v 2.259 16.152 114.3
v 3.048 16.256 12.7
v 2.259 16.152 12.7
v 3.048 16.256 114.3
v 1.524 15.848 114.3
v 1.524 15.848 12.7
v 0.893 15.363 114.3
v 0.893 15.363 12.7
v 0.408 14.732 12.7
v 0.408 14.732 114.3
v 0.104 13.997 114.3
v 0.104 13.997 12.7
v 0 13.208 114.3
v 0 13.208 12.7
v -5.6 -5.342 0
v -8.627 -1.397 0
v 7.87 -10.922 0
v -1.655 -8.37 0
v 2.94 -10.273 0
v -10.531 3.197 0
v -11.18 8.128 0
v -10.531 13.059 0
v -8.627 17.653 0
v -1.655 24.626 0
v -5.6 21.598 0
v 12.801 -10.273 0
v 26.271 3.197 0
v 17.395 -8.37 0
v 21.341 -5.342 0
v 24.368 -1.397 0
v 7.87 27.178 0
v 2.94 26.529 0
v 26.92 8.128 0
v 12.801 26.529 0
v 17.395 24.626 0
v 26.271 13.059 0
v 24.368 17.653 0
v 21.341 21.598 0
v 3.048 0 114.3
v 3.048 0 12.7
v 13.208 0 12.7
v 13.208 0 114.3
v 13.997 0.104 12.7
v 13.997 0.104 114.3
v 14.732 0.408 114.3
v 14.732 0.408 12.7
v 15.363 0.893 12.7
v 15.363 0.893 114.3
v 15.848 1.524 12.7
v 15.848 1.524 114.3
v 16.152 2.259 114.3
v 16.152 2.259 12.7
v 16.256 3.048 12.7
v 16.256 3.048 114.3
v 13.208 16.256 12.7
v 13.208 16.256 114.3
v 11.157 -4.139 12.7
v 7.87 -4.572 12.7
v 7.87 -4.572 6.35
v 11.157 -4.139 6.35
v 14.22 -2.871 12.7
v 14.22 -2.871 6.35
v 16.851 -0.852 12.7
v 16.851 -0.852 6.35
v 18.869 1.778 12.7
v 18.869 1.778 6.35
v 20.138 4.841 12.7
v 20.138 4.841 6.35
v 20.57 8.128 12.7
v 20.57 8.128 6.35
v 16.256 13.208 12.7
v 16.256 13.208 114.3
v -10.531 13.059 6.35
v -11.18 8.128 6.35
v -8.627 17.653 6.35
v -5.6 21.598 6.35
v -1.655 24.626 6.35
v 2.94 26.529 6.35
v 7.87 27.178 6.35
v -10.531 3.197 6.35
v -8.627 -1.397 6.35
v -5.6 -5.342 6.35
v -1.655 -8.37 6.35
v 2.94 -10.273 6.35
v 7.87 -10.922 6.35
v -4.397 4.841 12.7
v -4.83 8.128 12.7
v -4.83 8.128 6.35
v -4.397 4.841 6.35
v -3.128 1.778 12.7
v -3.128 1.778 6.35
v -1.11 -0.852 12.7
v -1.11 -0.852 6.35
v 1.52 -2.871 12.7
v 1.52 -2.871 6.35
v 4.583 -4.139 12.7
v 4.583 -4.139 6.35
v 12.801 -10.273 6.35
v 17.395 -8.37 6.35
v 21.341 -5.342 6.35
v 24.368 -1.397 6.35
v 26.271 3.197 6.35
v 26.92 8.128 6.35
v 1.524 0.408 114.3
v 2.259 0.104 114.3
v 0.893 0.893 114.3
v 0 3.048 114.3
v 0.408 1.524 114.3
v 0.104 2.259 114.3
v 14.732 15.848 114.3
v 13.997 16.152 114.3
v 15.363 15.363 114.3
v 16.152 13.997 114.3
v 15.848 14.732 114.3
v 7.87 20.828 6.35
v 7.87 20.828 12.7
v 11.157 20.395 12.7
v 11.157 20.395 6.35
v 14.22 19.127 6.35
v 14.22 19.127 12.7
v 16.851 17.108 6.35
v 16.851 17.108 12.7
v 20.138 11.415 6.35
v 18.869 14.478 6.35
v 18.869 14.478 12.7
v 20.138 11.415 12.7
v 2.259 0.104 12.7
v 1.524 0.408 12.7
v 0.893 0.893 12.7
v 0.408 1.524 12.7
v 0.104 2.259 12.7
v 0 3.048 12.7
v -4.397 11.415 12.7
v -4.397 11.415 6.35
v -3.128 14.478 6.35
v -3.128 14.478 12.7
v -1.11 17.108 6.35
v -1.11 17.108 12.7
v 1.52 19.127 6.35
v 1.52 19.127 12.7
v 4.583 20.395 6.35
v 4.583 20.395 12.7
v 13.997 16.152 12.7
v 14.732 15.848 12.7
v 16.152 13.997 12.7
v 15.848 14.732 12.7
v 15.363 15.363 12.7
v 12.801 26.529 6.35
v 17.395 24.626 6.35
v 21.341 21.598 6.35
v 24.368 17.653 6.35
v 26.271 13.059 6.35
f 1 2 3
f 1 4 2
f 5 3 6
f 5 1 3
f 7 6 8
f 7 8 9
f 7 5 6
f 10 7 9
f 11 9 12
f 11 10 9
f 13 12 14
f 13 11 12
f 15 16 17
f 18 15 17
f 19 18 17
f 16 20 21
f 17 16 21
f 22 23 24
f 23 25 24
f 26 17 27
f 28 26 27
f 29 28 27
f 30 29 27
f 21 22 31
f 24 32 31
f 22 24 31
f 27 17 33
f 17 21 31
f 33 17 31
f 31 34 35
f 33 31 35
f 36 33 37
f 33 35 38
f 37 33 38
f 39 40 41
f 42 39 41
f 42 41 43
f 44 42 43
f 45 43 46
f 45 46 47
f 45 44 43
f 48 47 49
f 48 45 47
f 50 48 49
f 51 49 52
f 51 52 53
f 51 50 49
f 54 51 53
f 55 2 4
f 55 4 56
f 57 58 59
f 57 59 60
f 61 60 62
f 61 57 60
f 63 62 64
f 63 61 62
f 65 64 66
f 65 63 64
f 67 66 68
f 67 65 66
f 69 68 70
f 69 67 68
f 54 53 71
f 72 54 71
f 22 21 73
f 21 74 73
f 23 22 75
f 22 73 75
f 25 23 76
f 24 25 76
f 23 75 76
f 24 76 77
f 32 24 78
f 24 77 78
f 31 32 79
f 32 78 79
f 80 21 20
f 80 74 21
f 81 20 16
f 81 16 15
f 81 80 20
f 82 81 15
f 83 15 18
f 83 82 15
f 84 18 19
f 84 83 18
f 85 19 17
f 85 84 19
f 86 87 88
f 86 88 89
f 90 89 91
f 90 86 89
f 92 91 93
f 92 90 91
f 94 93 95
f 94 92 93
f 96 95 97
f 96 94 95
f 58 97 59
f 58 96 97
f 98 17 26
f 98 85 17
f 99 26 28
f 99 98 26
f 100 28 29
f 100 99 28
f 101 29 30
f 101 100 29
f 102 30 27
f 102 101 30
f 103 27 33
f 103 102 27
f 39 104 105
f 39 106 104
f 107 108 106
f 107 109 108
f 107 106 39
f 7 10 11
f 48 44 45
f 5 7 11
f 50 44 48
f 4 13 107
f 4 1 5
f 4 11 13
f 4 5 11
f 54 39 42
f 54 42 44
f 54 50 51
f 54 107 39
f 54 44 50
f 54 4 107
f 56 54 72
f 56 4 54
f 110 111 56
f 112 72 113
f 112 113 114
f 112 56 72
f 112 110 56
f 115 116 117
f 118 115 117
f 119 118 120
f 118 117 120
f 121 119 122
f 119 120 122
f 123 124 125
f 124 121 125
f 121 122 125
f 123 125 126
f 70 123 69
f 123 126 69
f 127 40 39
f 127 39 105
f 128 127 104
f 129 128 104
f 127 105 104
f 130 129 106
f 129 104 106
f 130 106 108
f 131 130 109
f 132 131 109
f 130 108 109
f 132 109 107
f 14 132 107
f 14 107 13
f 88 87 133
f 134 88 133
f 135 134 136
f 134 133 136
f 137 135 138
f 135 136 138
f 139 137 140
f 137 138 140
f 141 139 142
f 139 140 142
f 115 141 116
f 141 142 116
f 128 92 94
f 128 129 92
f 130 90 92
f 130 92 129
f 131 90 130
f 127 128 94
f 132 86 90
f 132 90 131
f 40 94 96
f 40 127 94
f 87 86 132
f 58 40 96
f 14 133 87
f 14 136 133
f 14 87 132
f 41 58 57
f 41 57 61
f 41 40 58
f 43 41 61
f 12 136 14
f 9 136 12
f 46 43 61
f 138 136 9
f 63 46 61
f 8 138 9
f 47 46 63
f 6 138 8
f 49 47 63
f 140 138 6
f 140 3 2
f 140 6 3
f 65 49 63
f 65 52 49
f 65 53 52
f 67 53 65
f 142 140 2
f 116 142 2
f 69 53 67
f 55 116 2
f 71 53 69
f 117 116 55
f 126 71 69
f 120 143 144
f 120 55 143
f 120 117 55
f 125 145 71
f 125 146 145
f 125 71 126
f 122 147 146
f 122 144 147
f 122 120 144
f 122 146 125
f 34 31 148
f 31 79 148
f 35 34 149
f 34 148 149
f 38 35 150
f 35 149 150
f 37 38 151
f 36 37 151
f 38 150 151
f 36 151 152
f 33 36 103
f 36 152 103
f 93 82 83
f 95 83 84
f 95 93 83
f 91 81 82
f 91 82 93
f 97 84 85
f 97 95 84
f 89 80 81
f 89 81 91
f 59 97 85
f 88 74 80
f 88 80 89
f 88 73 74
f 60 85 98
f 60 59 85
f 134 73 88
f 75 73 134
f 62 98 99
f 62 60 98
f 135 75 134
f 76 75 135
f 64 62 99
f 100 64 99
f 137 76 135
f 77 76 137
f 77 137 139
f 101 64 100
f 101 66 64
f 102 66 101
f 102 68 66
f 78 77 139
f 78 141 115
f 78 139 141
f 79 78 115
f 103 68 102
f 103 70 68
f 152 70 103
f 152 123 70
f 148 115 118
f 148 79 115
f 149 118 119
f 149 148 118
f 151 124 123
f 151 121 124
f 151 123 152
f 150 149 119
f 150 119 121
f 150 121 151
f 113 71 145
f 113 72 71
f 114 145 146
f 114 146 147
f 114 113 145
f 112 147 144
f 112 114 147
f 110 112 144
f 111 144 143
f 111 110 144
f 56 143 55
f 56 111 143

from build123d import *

# Parameters (mm, degrees)
F0_W     = 16.256
F0_H     = 16.256
F1_DEPTH = 114.3
F0_W_2   = 25.4
F0_H_2   = 25.4
F2_DEPTH = 12.7
F3_R     = 3.048
F4_R     = 12.69999
F0_W_3   = 38.1
F0_H_3   = 38.1
F5_DEPTH = 6.35
F6_R     = 19.04999


# Not quite as in the source:
# - a fillet or chamfer is up to 0.001 mm smaller than in the source, because OpenCascade refuses the exact size


with BuildPart() as f1:
    # F0 (on Top) → F1 (new body)
    with BuildSketch(Plane.XY):
        with Locations((8.128, 8.128)):
            Rectangle(F0_W, F0_H)
    extrude(amount=F1_DEPTH)

    # F0 (on Top) → F2 (join)
    with BuildSketch(Plane.XY):
        with Locations((7.8703831056, 8.128)):
            Rectangle(F0_W_2, F0_H_2)
        with Locations((8.128, 8.128)):
            Rectangle(F0_W, F0_H, mode=Mode.SUBTRACT)
    extrude(amount=F2_DEPTH)

    # F3
    f3_edges = [f1.edges().sort_by_distance(p)[0] for p in [
        (0, 16.256, 63.5),
        (16.256, 16.256, 63.5),
        (16.256, 0, 63.5),
        (0, 0, 63.5),
    ]]
    fillet(f3_edges, radius=F3_R)

    # F4 (radius 12.7 in the source; OpenCascade refuses exactly that, so slightly less here)
    f4_edges = [f1.edges().sort_by_distance(p)[0] for p in [
        (-4.829617, 20.828, 6.35),
        (-4.829617, -4.572, 6.35),
        (20.570383, -4.572, 6.35),
        (20.570383, 20.828, 6.35),
    ]]
    fillet(f4_edges, radius=F4_R)

    # F0 (on Top) → F5 (join)
    with BuildSketch(Plane.XY):
        with Locations((7.8703831056, 8.128)):
            Rectangle(F0_W_3, F0_H_3)
        with Locations((7.8703831056, 8.128)):
            Rectangle(F0_W_2, F0_H_2, mode=Mode.SUBTRACT)
        with Locations((7.8703831056, 8.128)):
            Rectangle(F0_W_2, F0_H_2)
        with Locations((8.128, 8.128)):
            Rectangle(F0_W, F0_H, mode=Mode.SUBTRACT)
    extrude(amount=F5_DEPTH)

    # F6 (radius 19.05 in the source; OpenCascade refuses exactly that, so slightly less here)
    f6_edges = [f1.edges().sort_by_distance(p)[0] for p in [
        (-11.179617, 27.178, 3.175),
        (26.920383, 27.178, 3.175),
        (26.920383, -10.922, 3.175),
        (-11.179617, -10.922, 3.175),
    ]]
    fillet(f6_edges, radius=F6_R)


solid = f1.part
